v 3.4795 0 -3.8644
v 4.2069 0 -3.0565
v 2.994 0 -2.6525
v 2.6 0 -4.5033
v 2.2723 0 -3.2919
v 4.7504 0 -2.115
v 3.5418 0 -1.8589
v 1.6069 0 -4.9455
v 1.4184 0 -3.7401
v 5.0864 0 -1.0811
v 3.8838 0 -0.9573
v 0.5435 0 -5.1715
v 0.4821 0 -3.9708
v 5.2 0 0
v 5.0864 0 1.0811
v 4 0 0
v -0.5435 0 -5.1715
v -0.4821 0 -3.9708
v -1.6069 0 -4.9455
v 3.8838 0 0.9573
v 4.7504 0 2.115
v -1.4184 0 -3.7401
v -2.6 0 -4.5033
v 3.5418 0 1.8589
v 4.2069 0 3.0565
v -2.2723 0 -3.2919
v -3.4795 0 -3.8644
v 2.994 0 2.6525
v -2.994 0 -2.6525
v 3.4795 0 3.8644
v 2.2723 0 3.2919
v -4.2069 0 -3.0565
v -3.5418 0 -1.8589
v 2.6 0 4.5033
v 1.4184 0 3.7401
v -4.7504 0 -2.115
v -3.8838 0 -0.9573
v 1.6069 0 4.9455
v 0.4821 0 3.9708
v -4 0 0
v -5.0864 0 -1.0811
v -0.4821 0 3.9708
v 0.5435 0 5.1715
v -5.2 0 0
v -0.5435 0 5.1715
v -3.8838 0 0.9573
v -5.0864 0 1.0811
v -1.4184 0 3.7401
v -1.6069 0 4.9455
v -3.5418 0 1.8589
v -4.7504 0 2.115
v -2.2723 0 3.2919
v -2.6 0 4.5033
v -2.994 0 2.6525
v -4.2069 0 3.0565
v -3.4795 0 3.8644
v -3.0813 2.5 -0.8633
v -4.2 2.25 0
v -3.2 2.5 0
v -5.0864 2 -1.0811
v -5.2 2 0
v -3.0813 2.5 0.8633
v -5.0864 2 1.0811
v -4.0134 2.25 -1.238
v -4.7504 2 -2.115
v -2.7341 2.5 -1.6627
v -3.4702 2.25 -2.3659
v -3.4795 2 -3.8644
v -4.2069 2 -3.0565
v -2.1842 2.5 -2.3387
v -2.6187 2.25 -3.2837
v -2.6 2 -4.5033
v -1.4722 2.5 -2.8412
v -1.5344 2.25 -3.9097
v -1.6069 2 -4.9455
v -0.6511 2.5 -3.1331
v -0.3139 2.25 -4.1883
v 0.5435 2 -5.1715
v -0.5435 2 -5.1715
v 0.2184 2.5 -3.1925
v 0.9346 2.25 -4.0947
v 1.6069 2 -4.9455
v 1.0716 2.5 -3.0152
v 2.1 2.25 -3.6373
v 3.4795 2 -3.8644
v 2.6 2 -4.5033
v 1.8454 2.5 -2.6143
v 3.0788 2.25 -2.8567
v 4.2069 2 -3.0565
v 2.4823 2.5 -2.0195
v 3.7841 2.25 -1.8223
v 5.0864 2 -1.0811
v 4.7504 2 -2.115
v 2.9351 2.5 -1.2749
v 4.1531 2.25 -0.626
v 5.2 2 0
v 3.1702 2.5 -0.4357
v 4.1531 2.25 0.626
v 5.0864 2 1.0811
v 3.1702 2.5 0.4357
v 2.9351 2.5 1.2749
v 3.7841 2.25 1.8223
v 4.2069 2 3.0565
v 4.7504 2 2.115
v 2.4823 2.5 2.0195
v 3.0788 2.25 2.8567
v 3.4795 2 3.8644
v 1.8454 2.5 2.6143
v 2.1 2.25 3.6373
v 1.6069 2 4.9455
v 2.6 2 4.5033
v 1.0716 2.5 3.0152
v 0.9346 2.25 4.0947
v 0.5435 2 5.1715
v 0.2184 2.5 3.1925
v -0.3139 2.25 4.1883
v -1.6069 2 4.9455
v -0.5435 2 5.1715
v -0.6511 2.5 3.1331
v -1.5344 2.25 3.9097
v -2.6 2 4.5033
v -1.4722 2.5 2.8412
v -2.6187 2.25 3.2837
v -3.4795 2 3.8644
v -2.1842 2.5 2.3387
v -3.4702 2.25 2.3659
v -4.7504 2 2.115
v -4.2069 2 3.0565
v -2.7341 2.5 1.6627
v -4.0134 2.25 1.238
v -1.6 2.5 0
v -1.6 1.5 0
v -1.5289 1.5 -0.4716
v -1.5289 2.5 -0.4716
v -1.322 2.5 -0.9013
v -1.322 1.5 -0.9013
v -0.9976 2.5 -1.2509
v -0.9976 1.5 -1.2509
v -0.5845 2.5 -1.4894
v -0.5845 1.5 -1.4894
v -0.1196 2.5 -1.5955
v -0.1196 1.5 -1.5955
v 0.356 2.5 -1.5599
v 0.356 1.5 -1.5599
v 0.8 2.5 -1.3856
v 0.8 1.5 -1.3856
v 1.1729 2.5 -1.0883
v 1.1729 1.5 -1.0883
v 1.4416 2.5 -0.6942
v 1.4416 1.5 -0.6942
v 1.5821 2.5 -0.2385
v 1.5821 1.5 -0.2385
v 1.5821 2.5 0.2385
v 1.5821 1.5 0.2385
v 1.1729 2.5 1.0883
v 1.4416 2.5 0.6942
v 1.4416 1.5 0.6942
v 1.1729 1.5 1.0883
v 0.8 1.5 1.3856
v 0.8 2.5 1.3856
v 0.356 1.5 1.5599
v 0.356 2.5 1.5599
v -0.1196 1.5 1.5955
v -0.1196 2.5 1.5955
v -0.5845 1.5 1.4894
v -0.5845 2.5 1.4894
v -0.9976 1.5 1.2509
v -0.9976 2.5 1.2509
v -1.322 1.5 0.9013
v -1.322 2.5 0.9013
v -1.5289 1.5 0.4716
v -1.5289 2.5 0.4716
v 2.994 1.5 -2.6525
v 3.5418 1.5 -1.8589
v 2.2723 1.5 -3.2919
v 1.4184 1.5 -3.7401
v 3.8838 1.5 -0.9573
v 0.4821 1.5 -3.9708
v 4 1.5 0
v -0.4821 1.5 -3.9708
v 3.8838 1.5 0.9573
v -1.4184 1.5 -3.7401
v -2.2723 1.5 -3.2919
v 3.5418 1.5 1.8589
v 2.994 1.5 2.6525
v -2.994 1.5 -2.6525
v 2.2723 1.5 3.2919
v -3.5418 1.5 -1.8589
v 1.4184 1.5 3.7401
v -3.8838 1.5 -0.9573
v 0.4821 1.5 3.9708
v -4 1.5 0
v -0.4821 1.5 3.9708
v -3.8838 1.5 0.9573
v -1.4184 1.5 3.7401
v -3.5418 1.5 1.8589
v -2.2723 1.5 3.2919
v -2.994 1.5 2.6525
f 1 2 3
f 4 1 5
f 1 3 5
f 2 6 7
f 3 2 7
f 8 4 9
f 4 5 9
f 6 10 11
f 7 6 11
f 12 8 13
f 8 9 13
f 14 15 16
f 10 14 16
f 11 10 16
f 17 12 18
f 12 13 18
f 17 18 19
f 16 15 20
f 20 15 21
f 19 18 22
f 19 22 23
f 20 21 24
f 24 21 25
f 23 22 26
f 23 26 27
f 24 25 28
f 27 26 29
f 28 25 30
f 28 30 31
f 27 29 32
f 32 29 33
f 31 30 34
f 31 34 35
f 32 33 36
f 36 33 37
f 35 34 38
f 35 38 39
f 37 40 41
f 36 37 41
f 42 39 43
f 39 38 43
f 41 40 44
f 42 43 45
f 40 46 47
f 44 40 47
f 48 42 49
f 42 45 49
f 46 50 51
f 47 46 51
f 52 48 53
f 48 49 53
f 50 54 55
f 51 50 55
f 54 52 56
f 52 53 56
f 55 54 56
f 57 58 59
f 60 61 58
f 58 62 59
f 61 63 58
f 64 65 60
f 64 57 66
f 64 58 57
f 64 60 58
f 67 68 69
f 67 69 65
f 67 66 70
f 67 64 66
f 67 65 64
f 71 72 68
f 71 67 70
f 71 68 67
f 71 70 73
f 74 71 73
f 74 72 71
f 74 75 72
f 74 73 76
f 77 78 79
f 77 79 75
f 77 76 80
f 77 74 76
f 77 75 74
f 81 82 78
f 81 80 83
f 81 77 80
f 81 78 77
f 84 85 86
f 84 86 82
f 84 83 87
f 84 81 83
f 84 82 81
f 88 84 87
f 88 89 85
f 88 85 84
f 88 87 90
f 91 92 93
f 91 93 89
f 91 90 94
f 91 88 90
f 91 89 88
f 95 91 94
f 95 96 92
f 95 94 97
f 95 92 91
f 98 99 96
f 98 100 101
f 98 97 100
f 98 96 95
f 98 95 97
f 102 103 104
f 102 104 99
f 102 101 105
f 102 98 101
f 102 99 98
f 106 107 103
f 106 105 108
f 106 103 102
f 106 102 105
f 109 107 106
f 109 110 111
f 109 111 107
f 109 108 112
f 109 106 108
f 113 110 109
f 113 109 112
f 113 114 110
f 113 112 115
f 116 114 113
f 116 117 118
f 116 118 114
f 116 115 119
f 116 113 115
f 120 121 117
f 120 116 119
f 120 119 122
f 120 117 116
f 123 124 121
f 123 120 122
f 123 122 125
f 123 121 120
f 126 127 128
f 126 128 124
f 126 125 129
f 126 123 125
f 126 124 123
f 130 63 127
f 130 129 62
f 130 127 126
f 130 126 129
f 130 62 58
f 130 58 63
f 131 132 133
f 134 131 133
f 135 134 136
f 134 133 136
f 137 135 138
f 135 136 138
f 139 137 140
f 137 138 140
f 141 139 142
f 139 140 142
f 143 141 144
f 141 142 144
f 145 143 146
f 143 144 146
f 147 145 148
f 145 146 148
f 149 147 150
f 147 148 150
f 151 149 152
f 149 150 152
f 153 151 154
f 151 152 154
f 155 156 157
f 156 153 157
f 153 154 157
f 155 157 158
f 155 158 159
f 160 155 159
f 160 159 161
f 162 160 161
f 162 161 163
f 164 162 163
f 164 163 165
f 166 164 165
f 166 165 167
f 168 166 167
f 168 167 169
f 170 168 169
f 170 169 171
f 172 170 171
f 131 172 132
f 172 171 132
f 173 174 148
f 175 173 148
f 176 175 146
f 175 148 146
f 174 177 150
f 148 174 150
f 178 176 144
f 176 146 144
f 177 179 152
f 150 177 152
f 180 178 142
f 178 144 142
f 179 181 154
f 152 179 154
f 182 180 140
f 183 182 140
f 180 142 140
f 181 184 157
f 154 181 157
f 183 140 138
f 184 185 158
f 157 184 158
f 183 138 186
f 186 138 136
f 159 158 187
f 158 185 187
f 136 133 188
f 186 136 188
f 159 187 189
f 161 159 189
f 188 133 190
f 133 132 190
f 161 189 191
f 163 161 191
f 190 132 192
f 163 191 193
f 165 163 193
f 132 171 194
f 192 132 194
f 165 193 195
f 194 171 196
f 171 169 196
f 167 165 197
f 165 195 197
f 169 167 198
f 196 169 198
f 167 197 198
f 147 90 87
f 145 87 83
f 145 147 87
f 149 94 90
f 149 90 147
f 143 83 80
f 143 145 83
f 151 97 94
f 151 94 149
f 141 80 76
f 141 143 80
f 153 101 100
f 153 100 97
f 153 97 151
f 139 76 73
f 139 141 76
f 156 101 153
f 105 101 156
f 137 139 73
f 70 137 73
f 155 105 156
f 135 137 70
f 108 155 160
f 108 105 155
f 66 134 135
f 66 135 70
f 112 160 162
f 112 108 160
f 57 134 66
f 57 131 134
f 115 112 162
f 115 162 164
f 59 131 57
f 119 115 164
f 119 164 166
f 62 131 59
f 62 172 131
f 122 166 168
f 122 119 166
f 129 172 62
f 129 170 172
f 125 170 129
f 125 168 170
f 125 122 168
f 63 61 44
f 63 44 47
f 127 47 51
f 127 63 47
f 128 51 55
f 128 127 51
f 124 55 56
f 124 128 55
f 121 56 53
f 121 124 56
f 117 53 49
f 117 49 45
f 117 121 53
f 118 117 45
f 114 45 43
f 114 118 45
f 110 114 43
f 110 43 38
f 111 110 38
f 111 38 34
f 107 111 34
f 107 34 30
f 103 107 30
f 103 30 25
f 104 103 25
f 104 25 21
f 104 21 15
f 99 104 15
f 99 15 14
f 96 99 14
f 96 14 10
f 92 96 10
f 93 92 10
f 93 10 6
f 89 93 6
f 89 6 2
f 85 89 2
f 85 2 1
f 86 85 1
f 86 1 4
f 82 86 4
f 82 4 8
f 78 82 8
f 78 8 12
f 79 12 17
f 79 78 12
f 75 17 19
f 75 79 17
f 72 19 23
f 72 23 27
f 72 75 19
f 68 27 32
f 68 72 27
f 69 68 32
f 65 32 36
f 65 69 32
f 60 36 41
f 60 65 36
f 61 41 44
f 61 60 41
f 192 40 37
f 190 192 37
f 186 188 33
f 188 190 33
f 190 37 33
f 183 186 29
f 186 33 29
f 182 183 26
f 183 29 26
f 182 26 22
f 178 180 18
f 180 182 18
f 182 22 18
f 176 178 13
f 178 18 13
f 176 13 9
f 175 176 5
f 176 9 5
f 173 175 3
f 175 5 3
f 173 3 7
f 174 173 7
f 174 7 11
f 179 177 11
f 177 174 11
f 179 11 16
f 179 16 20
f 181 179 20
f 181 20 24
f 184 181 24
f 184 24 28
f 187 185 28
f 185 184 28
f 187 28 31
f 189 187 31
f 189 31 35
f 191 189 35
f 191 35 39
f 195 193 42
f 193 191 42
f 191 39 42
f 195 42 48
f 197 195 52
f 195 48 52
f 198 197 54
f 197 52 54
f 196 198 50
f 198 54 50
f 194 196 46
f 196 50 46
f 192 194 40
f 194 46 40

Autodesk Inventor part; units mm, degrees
ref_plane "YZ-Ebene" through (0, 0, 0) normal (1, 0, 0) x (0, 1, 0)
ref_plane "XZ-Ebene" through (0, 0, 0) normal (0, 1, 0) x (-1, 0, 0)
ref_plane "XY-Ebene" through (0, 0, 0) normal (0, 0, 1) x (1, 0, 0)
sketch "Skizze1" plane through (0, 0, 0) normal (0, 0, 1) x (1, 0, 0)
  line L0 (-6.24, 0) -> (1.04, 0) projected
  line L1 (0, -0.5) -> (0, 3) projected
  line L2 (-5.2, 0) -> (-5.2, 2)
  line L3 (-5.2, 2) -> (-3.2, 2.5)
  line L4 (-3.2, 2.5) -> (-1.6, 2.5)
  line L5 (-1.6, 2.5) -> (-1.6, 1.5)
  line L6 (-1.6, 1.5) -> (-4, 1.5)
  line L7 (-4, 1.5) -> (-4, 0)
  point P0 (0, 0)
  dimension "d3" = 3.2
  dimension "d4" = 6.4
  dimension "d5" = 8
  dimension "d6" = 10.4
  dimension "d7" = 2
  dimension "d8" = 2.5
  dimension "d9" = 1.5
revolve "Umdrehung1" add sketch "Skizze1" angle 360 about axis through (0, -10, 0) along (0, 1, 0)
properties part number "Deckel_ra8846s" material "Stahl"
